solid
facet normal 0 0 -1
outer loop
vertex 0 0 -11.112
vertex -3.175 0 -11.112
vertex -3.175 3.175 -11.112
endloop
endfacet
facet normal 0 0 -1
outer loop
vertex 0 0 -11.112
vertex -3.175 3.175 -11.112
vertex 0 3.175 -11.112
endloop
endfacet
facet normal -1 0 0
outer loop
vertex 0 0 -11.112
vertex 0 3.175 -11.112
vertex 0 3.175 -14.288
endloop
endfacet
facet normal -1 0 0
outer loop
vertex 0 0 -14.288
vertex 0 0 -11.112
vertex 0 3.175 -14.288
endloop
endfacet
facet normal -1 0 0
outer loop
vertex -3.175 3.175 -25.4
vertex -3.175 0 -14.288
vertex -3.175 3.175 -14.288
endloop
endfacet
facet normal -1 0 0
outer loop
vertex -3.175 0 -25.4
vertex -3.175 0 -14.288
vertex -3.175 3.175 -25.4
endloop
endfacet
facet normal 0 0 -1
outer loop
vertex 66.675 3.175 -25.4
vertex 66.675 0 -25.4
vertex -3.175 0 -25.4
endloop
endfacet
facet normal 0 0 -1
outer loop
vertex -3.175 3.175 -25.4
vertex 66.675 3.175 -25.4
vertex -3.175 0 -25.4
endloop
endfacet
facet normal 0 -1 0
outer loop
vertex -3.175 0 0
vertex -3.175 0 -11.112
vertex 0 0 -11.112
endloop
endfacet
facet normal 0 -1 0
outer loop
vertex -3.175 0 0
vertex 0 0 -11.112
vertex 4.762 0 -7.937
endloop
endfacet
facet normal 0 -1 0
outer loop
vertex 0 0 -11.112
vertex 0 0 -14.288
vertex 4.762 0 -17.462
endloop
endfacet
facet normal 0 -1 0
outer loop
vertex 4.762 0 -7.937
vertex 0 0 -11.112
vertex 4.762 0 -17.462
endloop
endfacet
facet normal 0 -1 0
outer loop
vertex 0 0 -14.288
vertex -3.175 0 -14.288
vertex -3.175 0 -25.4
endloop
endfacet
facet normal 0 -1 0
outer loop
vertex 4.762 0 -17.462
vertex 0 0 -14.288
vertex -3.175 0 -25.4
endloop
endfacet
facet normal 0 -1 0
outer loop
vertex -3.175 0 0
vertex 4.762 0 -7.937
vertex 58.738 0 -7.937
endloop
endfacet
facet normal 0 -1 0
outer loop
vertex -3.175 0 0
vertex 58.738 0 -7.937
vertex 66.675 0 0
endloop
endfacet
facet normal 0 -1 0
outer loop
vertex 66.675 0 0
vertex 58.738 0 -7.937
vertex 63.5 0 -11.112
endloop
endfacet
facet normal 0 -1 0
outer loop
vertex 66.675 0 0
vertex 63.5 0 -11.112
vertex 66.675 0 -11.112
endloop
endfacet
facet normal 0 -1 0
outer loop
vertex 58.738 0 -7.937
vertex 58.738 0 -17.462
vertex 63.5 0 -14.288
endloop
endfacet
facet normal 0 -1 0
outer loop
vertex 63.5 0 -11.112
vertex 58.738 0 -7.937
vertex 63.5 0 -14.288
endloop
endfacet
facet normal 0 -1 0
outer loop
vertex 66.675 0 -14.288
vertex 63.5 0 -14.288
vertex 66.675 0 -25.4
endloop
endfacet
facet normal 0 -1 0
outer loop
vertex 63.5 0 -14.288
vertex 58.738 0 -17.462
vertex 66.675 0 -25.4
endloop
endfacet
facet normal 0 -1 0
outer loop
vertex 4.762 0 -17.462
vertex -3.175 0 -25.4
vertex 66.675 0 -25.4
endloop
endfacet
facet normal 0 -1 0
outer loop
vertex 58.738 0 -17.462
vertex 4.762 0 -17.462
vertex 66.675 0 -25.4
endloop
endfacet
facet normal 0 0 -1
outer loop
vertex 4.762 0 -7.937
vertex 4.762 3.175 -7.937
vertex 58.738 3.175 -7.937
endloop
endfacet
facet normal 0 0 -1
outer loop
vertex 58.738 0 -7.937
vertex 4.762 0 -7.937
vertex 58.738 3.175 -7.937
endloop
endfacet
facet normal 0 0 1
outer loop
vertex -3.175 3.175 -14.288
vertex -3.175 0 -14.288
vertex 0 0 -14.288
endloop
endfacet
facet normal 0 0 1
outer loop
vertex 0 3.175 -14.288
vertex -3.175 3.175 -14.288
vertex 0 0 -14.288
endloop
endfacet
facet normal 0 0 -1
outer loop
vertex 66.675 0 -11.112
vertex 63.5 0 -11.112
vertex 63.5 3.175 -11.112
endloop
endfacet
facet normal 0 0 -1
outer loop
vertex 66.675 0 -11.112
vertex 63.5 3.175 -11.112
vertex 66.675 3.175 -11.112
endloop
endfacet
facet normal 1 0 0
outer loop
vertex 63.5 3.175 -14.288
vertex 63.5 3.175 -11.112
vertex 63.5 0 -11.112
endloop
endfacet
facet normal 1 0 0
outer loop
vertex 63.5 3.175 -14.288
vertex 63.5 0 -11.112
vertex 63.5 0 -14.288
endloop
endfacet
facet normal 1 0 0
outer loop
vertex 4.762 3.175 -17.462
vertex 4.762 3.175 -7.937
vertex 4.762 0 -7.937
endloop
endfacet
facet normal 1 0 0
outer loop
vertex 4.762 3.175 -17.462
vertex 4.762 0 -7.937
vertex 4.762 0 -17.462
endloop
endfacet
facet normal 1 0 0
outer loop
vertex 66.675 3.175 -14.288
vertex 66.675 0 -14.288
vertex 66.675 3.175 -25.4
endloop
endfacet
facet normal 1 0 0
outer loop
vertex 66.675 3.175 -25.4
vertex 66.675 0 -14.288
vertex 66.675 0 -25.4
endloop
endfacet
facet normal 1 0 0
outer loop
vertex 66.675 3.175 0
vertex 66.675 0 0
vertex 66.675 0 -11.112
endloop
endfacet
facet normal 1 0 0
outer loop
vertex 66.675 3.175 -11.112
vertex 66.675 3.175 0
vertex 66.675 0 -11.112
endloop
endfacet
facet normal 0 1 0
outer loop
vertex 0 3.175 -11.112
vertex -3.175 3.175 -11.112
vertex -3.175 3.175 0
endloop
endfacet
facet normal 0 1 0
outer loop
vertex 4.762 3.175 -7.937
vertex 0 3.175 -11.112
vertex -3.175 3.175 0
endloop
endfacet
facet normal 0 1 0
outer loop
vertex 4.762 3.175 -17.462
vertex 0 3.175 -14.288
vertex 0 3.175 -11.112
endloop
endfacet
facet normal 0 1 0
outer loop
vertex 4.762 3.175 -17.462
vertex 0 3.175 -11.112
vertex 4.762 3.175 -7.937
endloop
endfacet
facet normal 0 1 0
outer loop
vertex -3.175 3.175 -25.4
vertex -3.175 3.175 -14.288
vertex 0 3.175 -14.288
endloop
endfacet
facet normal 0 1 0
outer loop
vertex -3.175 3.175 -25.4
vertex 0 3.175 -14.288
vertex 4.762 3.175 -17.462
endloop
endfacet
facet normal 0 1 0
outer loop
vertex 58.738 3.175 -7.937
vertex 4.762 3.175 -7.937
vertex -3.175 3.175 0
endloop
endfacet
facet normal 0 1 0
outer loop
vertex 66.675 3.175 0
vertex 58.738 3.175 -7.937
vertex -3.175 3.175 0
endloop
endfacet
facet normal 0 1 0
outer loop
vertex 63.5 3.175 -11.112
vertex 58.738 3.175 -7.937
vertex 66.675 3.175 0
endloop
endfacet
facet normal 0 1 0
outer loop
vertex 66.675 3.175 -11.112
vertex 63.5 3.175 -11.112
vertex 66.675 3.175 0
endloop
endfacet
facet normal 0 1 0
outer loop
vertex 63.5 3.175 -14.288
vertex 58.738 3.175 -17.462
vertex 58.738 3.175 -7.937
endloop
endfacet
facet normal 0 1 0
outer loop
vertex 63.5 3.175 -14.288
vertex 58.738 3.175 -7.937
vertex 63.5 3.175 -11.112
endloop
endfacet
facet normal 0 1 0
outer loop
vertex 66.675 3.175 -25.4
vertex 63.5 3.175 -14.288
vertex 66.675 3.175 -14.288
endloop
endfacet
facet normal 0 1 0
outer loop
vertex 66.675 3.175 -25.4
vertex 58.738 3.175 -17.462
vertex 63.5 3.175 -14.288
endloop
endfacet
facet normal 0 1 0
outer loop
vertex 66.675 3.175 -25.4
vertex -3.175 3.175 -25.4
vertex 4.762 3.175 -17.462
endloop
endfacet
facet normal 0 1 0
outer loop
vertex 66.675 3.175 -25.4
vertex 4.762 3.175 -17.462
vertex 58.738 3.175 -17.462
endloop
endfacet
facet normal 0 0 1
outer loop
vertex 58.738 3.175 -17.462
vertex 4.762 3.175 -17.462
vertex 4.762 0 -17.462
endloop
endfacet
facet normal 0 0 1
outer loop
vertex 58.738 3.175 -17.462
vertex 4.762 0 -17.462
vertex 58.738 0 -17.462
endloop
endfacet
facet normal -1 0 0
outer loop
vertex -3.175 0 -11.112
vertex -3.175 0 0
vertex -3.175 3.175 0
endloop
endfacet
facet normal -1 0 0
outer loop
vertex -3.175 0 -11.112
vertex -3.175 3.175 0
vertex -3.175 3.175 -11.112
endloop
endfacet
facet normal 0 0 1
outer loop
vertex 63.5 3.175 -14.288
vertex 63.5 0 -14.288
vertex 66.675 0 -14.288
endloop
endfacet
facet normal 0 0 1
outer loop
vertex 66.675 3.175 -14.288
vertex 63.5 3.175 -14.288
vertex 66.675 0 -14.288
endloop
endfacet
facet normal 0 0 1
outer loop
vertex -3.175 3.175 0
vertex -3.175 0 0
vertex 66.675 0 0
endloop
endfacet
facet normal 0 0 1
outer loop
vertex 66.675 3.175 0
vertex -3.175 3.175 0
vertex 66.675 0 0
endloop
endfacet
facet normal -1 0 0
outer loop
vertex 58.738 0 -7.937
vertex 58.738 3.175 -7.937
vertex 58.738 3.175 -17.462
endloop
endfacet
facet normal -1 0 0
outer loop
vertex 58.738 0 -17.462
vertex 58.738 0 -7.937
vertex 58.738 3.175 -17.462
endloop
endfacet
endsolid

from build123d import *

# Parameters (mm, degrees)
SKETCH1_W           = 63.5
SKETCH1_H           = 25.4
SKETCH1_W_2         = 3.175
SKETCH1_H_2         = 11.1125
BOSS_EXTRUDE1_DEPTH = 3.175
SKETCH2_W           = 53.975
SKETCH2_H           = 9.525
CUT_EXTRUDE1_DEPTH  = 72.419858933


with BuildPart() as part:
    # Sketch1 → Boss-Extrude1 (new body)
    with BuildSketch(Plane(origin=(0, 0, 0), x_dir=(1, 0, 0), z_dir=(0, 1, 0))):
        with Locations((31.75, 12.7)):
            Rectangle(SKETCH1_W, SKETCH1_H)
        with Locations((-1.5875, 19.84375)):
            Rectangle(SKETCH1_W_2, SKETCH1_H_2)
        with Locations((-1.5875, 5.55625)):
            Rectangle(SKETCH1_W_2, SKETCH1_H_2)
        with Locations((65.0875, 19.84375)):
            Rectangle(SKETCH1_W_2, SKETCH1_H_2)
        with Locations((65.0875, 5.55625)):
            Rectangle(SKETCH1_W_2, SKETCH1_H_2)
    extrude(amount=BOSS_EXTRUDE1_DEPTH)

    # Sketch2 → Cut-Extrude1 (cut, through all)
    with BuildSketch(Plane(origin=(0, 3.175, 0), x_dir=(1, 0, 0), z_dir=(0, 1, 0))):
        with Locations((31.75, 12.7)):
            Rectangle(SKETCH2_W, SKETCH2_H)
    extrude(amount=-CUT_EXTRUDE1_DEPTH, mode=Mode.SUBTRACT)


solid = part.part
